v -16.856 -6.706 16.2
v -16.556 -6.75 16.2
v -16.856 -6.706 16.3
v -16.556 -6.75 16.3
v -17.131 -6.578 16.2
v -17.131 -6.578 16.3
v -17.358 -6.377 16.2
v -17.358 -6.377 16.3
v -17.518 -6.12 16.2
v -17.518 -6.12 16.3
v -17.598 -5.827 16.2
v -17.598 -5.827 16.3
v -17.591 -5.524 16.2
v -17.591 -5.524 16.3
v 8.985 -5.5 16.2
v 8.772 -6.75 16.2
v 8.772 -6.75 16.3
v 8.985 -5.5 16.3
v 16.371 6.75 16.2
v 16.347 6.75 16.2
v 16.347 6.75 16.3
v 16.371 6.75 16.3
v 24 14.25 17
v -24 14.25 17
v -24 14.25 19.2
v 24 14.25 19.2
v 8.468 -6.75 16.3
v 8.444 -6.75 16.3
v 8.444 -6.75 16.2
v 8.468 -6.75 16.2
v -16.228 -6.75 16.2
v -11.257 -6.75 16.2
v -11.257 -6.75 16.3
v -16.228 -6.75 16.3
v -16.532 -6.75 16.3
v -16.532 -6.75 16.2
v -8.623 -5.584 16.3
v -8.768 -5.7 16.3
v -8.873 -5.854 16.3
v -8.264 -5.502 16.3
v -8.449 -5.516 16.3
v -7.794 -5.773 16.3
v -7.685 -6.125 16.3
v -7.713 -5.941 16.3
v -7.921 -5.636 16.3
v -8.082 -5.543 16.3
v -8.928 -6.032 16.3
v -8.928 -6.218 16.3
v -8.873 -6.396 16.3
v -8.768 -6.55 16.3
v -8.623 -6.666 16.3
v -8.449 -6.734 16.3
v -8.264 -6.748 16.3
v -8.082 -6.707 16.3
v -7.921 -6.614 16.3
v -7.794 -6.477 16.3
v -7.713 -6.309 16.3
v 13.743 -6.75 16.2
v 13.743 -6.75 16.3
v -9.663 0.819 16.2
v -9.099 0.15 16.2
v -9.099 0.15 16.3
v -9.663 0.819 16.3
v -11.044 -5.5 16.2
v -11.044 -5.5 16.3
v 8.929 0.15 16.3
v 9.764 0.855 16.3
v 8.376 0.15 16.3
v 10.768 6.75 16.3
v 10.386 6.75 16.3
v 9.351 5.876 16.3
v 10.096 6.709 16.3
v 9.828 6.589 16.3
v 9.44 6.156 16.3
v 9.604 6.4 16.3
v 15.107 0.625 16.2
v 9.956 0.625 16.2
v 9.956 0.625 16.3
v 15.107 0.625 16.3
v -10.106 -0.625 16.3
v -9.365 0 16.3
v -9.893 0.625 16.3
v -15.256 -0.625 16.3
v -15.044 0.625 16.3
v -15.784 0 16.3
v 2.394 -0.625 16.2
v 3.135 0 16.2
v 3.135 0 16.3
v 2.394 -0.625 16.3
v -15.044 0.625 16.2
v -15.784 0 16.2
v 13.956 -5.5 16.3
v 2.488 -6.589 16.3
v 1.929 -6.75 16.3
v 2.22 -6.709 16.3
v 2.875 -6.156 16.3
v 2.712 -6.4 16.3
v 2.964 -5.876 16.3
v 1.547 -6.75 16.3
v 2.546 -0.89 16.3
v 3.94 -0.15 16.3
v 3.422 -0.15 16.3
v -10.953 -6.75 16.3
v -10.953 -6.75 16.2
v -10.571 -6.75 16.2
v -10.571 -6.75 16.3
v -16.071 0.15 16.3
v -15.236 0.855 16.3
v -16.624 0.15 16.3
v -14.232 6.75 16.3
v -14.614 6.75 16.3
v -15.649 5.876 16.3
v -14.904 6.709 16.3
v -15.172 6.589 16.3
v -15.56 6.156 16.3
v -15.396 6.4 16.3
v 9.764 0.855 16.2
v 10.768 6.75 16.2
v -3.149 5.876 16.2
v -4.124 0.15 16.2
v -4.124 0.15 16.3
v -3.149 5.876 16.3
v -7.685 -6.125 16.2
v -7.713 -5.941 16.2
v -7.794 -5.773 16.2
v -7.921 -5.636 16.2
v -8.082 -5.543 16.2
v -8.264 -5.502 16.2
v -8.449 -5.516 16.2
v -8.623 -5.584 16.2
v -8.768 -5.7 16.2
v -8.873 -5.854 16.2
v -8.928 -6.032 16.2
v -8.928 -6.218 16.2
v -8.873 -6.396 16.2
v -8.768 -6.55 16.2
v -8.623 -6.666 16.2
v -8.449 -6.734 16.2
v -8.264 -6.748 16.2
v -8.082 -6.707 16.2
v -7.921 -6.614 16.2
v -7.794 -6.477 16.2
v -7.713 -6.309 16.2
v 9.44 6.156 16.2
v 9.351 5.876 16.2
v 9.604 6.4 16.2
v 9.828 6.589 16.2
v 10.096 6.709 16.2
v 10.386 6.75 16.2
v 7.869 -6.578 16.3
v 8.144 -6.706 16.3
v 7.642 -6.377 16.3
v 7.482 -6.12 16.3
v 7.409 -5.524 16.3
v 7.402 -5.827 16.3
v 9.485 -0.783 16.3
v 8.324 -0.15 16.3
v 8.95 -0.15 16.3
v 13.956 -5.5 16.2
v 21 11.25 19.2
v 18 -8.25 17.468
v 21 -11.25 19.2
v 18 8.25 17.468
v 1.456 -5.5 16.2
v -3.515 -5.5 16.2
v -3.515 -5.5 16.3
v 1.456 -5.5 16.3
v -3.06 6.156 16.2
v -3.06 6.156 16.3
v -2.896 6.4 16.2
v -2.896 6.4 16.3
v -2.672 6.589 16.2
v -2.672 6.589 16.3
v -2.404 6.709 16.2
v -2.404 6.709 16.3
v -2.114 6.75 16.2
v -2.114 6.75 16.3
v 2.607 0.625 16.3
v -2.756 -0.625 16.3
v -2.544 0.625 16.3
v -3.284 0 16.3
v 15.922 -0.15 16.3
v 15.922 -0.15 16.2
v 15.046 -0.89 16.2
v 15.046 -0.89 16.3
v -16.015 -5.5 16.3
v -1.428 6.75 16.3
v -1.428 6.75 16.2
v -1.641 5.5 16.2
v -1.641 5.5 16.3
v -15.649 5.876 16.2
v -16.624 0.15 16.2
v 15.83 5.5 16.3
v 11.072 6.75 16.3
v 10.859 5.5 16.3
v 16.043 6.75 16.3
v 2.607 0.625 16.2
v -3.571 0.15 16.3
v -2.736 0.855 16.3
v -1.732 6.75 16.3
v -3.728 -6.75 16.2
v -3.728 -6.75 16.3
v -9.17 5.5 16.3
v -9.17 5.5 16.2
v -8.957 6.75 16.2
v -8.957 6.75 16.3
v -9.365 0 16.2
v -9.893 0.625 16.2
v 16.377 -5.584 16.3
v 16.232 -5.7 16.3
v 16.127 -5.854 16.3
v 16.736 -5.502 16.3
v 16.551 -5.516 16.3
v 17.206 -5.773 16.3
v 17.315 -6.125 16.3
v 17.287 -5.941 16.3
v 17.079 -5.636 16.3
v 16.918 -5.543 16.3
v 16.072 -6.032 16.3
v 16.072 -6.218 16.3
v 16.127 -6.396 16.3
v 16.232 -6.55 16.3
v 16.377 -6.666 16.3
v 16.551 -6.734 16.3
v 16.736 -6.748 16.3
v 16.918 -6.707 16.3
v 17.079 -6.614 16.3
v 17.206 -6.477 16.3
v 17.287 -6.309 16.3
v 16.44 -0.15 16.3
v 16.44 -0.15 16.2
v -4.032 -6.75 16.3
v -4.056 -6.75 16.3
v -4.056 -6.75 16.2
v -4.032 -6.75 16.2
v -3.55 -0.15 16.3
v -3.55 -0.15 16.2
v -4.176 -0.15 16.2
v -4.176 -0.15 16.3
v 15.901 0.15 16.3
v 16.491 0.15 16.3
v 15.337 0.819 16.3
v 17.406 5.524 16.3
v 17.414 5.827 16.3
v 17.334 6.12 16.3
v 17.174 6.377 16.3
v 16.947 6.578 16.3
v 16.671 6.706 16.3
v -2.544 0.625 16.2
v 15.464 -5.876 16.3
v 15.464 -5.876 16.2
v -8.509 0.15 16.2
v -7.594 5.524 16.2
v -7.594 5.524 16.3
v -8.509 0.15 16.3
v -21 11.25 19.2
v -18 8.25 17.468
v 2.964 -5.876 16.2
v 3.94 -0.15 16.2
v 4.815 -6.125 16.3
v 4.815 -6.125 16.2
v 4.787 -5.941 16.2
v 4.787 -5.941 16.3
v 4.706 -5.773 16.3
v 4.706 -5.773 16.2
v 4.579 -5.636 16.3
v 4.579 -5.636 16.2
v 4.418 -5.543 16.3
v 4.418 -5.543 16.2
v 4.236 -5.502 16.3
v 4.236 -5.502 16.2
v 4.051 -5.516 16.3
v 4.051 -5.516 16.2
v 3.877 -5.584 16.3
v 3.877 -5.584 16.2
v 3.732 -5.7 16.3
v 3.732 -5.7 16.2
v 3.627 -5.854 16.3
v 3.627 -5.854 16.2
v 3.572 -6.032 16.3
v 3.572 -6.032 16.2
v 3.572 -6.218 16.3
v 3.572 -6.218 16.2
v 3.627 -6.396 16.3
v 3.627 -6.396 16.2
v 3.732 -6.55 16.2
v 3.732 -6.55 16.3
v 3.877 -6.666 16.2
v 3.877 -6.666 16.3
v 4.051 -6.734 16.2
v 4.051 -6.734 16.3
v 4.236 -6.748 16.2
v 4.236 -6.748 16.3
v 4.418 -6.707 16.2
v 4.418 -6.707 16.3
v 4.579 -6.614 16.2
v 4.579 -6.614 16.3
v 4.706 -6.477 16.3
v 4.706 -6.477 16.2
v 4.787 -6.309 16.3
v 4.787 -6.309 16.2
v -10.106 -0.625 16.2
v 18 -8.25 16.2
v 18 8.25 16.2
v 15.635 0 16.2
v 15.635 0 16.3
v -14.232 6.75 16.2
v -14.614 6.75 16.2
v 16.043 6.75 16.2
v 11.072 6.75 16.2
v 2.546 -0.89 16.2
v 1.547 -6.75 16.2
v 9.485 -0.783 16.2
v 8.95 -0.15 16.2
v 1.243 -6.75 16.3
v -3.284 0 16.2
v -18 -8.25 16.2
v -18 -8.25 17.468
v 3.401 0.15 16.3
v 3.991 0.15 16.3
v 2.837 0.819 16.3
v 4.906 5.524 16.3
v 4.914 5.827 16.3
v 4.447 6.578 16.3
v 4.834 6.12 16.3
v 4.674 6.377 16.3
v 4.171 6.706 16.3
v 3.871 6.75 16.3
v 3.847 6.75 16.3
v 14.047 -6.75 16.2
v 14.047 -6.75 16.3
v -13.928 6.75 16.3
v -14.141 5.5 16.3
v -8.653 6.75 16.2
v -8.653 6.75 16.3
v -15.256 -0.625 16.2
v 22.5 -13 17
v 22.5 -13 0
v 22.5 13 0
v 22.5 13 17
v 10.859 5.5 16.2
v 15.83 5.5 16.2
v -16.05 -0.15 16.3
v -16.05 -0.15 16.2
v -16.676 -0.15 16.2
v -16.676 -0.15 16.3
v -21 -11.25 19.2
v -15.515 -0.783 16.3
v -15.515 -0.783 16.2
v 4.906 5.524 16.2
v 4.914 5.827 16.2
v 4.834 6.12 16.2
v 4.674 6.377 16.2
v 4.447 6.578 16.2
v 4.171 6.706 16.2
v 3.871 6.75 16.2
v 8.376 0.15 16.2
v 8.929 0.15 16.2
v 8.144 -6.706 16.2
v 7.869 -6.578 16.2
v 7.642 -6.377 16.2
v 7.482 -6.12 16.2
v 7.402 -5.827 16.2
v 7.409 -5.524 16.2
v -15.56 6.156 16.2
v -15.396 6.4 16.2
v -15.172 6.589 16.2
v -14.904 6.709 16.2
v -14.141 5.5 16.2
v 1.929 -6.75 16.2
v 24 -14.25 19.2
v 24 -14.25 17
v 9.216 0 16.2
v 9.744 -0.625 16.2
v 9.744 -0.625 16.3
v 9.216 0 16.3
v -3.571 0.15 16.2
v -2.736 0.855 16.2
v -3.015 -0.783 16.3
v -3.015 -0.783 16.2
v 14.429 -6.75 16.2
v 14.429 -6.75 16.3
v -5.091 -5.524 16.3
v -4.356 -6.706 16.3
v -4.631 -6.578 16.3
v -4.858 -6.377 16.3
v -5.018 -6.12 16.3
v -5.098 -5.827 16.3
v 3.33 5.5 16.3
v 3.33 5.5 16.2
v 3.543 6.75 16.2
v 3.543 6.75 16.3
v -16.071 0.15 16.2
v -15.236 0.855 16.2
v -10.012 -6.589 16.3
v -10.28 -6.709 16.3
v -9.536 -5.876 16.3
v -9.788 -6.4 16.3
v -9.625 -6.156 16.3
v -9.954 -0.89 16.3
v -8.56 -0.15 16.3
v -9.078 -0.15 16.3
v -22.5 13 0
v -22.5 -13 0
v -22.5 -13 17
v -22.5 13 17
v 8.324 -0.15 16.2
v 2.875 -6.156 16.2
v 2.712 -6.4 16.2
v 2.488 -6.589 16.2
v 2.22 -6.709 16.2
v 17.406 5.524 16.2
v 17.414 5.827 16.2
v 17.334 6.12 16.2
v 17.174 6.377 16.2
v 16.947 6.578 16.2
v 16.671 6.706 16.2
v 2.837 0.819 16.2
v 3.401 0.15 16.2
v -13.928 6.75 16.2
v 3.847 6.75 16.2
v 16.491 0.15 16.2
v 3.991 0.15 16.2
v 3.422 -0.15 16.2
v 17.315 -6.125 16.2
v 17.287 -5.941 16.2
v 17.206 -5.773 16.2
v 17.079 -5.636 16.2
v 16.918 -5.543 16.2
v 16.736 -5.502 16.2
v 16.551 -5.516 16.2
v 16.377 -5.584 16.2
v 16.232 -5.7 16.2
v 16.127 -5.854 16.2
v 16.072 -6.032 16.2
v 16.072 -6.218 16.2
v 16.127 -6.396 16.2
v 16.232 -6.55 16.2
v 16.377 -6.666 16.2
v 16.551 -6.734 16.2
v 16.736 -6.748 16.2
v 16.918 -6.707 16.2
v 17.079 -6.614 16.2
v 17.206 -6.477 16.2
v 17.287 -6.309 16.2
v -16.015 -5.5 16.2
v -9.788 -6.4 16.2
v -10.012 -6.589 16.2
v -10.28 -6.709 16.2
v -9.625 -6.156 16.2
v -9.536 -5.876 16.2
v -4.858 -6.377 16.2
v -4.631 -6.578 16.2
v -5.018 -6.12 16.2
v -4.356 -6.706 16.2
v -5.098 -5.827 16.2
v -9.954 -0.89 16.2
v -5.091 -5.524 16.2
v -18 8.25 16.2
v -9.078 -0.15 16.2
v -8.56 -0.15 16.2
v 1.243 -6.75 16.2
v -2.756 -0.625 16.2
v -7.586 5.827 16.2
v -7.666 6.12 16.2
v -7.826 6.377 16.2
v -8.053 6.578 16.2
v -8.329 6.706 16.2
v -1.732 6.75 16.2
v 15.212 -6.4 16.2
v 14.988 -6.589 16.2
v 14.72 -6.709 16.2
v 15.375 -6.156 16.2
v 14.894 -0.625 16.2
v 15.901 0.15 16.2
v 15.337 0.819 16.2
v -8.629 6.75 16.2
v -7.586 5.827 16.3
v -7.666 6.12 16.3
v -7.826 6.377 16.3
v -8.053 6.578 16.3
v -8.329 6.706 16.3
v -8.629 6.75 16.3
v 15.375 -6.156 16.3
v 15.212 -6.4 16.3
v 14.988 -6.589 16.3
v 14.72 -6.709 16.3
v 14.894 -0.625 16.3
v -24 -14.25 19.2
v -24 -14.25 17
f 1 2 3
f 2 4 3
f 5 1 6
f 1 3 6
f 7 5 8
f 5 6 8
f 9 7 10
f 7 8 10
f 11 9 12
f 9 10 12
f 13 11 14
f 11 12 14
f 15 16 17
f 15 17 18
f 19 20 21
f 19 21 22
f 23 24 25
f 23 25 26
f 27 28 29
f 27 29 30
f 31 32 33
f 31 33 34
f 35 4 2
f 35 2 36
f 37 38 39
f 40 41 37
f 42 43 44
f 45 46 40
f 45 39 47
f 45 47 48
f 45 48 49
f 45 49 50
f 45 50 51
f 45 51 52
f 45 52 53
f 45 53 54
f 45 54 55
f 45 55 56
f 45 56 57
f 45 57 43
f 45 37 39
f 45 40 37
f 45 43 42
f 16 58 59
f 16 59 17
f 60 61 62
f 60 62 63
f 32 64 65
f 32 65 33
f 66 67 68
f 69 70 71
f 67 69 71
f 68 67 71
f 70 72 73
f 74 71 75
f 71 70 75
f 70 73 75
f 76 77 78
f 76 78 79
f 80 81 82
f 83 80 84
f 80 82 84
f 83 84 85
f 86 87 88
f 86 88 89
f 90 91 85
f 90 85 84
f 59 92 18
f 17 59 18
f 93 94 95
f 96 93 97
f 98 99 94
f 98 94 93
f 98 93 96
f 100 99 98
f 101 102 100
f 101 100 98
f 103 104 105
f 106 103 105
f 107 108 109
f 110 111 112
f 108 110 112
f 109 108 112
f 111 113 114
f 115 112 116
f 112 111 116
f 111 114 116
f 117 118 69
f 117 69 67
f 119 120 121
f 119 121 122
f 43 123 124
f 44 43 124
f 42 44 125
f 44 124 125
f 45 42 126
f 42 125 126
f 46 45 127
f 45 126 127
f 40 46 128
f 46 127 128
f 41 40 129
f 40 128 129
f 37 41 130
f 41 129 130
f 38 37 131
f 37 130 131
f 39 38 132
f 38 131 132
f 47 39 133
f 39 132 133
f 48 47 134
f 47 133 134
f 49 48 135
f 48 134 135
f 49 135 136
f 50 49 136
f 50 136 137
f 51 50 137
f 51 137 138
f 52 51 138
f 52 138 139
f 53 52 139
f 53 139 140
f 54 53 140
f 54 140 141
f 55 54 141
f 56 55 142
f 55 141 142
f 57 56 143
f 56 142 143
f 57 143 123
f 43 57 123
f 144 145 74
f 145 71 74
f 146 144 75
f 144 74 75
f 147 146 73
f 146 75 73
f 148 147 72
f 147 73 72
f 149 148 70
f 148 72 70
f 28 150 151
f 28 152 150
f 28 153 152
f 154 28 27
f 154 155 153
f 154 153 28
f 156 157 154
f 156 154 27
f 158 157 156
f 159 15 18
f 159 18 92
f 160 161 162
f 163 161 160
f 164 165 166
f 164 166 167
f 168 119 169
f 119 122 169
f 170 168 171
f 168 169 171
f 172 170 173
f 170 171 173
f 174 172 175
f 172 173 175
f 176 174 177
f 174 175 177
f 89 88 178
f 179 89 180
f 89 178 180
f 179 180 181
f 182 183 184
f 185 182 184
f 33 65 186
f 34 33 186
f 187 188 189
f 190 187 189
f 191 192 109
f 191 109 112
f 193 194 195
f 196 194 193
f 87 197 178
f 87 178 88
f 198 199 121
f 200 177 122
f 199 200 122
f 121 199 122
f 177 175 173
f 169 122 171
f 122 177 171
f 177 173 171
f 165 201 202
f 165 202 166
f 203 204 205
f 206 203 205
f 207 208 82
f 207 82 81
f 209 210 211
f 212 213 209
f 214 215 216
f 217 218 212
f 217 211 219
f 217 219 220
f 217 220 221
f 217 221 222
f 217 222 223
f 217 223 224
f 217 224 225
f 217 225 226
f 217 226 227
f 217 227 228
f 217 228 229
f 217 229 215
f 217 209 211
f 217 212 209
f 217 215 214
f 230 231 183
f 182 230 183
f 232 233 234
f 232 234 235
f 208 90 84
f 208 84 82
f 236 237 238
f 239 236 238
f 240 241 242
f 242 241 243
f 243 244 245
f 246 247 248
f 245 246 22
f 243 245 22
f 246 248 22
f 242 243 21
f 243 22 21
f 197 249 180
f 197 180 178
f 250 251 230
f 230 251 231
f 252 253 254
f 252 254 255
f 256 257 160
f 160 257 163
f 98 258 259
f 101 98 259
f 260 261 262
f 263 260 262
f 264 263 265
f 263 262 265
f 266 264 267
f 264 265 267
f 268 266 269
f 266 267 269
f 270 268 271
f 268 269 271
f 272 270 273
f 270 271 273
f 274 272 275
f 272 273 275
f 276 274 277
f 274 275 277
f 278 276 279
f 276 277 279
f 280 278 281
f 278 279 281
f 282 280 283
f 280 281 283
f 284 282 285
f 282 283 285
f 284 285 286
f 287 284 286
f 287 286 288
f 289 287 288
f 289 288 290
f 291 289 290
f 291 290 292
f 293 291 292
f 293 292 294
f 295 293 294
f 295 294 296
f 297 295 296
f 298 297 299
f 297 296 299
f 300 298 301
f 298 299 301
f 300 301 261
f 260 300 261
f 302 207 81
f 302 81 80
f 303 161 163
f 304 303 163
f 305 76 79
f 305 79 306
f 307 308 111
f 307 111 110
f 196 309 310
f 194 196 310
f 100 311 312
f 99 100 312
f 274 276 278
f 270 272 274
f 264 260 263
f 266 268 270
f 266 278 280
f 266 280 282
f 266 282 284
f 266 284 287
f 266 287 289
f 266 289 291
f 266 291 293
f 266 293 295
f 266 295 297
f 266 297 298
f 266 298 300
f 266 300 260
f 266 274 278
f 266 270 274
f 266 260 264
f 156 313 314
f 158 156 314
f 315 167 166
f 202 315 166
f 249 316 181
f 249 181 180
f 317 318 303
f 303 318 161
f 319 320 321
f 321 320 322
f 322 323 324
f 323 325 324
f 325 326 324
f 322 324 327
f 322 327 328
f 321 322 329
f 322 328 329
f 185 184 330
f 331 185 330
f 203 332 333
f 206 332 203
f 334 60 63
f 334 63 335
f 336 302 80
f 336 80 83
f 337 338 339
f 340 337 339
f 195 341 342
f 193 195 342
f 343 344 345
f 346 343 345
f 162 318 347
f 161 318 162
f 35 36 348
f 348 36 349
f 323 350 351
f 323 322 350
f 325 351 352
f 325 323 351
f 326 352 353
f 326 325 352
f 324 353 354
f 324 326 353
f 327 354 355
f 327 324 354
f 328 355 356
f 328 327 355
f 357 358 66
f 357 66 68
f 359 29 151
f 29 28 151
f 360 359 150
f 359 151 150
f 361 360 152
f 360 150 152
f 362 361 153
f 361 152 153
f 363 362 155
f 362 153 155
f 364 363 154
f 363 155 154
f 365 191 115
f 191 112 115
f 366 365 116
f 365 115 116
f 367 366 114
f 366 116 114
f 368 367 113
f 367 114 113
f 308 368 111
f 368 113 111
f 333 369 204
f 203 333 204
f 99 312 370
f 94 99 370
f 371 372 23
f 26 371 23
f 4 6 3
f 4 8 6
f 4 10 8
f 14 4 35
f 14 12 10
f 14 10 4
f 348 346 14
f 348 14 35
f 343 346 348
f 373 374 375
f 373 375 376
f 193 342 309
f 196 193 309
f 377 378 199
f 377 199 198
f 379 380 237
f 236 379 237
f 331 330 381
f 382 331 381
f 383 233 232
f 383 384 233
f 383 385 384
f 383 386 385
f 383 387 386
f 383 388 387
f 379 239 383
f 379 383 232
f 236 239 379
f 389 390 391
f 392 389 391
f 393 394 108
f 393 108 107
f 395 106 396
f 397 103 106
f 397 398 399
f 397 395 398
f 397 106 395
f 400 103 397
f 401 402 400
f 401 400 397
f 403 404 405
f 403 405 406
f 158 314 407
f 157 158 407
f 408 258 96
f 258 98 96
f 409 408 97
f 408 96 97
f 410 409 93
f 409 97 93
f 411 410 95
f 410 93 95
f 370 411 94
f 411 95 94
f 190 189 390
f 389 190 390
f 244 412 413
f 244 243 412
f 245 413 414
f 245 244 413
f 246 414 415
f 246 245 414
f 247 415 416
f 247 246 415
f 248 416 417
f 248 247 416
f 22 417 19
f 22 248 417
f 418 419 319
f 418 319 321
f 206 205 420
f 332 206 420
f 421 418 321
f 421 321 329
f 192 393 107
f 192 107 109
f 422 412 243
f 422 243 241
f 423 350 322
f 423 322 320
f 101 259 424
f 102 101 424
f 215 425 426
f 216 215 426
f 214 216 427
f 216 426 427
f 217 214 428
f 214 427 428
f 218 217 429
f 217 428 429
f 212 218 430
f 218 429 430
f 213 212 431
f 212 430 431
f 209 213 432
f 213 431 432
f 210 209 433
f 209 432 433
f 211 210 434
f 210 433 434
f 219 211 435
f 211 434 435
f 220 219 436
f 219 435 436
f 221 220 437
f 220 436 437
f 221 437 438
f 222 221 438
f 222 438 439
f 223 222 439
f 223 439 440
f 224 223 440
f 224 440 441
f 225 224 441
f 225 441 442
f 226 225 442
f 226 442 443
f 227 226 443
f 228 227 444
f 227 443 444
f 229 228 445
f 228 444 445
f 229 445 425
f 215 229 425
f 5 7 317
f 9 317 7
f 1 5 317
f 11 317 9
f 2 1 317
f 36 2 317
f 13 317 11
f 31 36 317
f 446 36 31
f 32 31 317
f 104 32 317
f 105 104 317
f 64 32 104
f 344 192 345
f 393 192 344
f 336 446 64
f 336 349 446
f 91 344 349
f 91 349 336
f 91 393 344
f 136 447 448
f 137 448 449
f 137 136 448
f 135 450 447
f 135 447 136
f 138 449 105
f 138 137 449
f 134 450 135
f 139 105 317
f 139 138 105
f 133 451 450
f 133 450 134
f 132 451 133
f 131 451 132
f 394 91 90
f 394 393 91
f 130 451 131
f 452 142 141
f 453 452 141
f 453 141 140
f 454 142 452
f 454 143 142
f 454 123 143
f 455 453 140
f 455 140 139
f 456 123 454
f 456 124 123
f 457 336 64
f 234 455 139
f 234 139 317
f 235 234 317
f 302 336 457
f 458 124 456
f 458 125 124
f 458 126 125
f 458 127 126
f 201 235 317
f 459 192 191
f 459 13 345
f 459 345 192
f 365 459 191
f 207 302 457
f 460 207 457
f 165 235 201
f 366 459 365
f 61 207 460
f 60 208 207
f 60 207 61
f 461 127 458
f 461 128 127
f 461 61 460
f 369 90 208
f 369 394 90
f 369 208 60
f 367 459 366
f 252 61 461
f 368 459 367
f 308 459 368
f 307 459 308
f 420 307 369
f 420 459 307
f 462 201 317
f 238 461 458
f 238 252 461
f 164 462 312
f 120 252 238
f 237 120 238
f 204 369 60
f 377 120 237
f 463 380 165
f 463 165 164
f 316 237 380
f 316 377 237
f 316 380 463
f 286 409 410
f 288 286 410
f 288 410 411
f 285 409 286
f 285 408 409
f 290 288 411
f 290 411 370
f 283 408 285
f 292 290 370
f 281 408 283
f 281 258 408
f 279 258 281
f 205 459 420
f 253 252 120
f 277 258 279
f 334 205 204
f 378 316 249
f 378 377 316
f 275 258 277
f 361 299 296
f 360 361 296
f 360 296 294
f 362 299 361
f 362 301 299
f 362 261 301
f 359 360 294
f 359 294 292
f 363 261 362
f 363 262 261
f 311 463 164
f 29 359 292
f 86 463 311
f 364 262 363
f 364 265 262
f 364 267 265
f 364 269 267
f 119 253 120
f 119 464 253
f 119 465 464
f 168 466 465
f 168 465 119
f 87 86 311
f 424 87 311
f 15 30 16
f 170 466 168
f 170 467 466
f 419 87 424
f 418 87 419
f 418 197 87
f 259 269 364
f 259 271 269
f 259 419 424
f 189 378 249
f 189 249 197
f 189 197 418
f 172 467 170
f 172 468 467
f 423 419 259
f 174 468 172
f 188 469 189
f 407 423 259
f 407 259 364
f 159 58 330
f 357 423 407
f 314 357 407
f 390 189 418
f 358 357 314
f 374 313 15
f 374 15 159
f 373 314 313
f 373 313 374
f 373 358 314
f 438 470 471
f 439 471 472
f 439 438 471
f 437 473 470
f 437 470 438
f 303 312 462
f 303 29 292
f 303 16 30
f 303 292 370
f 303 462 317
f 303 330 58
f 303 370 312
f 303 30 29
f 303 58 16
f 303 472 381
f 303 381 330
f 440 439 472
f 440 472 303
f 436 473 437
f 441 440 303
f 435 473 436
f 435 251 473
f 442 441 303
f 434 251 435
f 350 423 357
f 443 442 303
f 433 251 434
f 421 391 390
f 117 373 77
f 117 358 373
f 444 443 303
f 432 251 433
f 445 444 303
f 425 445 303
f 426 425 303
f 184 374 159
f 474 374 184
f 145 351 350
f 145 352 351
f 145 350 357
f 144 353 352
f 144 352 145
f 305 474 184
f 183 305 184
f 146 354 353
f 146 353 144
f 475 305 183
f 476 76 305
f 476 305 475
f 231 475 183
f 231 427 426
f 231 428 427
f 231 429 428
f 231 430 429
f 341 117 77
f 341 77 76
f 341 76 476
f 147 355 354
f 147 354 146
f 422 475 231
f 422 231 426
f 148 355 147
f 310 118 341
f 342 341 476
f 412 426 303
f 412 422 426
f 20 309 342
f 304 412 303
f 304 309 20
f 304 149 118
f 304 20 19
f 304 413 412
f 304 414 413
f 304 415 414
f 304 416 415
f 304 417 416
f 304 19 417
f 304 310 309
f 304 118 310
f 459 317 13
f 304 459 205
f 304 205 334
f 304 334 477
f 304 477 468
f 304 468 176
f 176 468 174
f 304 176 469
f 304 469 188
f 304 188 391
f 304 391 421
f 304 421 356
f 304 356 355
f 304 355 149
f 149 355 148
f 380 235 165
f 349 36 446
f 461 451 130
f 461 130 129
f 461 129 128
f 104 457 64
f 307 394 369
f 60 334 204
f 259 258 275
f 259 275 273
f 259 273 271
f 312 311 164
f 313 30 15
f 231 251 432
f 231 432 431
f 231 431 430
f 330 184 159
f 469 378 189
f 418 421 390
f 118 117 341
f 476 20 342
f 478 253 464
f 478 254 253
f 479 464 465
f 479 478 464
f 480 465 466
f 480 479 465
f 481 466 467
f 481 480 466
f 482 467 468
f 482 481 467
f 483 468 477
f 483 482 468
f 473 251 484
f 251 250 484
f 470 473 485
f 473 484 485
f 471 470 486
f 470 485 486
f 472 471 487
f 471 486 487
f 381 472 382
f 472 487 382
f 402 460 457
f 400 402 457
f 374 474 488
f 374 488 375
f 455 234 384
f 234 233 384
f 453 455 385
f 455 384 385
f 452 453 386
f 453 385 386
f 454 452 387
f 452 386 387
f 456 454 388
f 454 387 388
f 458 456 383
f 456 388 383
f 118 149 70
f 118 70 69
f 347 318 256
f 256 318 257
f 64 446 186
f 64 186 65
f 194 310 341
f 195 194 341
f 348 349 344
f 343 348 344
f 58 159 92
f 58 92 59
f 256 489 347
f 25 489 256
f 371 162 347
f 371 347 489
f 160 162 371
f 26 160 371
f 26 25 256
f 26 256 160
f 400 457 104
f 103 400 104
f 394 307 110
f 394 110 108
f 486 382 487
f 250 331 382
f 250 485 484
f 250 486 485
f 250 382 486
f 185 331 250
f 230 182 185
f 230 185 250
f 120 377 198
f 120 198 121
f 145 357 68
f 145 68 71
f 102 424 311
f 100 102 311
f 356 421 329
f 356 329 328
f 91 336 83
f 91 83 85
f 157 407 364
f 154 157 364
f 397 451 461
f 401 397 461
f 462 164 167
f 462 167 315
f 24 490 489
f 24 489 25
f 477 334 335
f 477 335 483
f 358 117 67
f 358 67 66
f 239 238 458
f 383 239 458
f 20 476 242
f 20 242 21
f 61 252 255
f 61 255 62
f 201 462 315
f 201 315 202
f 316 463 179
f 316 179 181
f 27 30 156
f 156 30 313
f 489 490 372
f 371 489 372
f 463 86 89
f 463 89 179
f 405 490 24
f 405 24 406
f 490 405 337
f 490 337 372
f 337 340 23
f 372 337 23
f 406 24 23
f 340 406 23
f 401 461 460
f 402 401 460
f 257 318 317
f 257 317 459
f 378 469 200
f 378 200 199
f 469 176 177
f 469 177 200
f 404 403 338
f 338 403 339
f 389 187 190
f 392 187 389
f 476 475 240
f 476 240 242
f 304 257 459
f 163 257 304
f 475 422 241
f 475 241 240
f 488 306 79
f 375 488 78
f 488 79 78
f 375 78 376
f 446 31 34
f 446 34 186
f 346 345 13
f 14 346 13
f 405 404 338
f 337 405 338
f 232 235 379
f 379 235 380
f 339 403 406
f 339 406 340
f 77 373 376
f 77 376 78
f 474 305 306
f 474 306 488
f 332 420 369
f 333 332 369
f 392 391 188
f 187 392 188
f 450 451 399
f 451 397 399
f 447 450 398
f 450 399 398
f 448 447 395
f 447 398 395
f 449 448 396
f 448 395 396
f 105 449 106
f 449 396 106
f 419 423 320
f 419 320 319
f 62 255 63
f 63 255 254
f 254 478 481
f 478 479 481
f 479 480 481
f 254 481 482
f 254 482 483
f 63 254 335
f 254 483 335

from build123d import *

# Parameters (mm, degrees)
SKETCH_1_W                    = 45
SKETCH_1_H                    = 26
BOSS_EXTRUDE1_DEPTH           = 17
SKETCH_W                      = 48
SKETCH_H                      = 28.5
BOSS_EXTRUDE2_DEPTH           = 2.2
SKETCH_3_W                    = 36
SKETCH_3_H                    = 16.5
CUT_EXTRUDE1_DEPTH            = 3
CHAMFER_1_SIZE                = 3
CHAMFER_1_SIZE2               = 1.732050808
SKETCH_4_R                    = 0.625
BOSS_EXTRUDE3_DEPTH           = 0.1
ROUNDING_1_R                  = 1.05
LINEAR_ARRAY1_COUNT           = 3
LINEAR_ARRAY1_PITCH           = 12.5
ROUNDING_1_OF_LINEAR_ARRAY1_R = 1.05


with BuildPart() as part:
    # sketch 1 → Boss-Extrude1 (new body)
    with BuildSketch(Plane.XY):
        Rectangle(SKETCH_1_W, SKETCH_1_H)
    extrude(amount=BOSS_EXTRUDE1_DEPTH)

    # sketch → Boss-Extrude2 (add)
    with BuildSketch(Plane.XY.offset(17)):
        Rectangle(SKETCH_W, SKETCH_H)
    extrude(amount=BOSS_EXTRUDE2_DEPTH)

    # sketch 3 → Cut-Extrude1 (cut)
    with BuildSketch(Plane.XY.offset(19.2)):
        Rectangle(SKETCH_3_W, SKETCH_3_H)
    extrude(amount=-CUT_EXTRUDE1_DEPTH, mode=Mode.SUBTRACT)

    # chamfer 1
    chamfer_1_edges = [part.edges().sort_by_distance(p)[0] for p in [
        (-18, 0, 19.2),
        (0, -8.25, 19.2),
        (18, 0, 19.2),
        (0, 8.25, 19.2),
    ]]
    chamfer_1_side = [part.faces().sort_by_distance(p)[0] for p in [
        (0, -13.691766178, 19.2),
    ]]
    chamfer(chamfer_1_edges, length=CHAMFER_1_SIZE, length2=CHAMFER_1_SIZE2, reference=chamfer_1_side[0])

    # sketch 4 → Boss-Extrude3 (add)
    with BuildSketch(Plane.XY.offset(16.2)):
        with Locations((-8.310233245, -6.125)):
            Circle(SKETCH_4_R)
        Polygon((-17.8, -6.75), (-16.531988477, -6.75), (-15.515440373, -0.783304607), (-16.049974064, -0.15), (-16.675555556, -0.15), align=None)
        Polygon((-9.68472625, -6.75), (-8.560281805, -0.15), (-9.077616658, -0.15), (-9.954369729, -0.890013653), (-10.952737773, -6.75), align=None)
        Polygon((-15.5, 6.75), (-14.231988477, 6.75), (-15.236353449, 0.854814294), (-16.071403038, 0.15), (-16.624444444, 0.15), align=None)
        Polygon((-8.509170694, 0.15), (-9.099045632, 0.15), (-9.66328895, 0.818503966), (-8.652737773, 6.75), (-7.38472625, 6.75), align=None)
        Polygon((-15.784003603, 0), (-15.04351636, 0.625), (-9.892540373, 0.625), (-9.365016093, 0), (-10.105503336, -0.625), (-15.256479323, -0.625), align=None)
        Polygon((-13.927665711, 6.75), (-14.140628674, 5.5), (-9.170023502, 5.5), (-8.957060539, 6.75), align=None)
        Polygon((-16.227665711, -6.75), (-16.014702748, -5.5), (-11.044097576, -5.5), (-11.257060539, -6.75), align=None)
    boss_extrude3 = extrude(amount=BOSS_EXTRUDE3_DEPTH)

    # rounding 1
    rounding_1_edges = [part.edges().sort_by_distance(p)[0] for p in [
        (-17.8, -6.75, 16.25),
        (-9.68472625, -6.75, 16.25),
        (-7.38472625, 6.75, 16.25),
        (-15.5, 6.75, 16.25),
    ]]
    fillet(rounding_1_edges, radius=ROUNDING_1_R)

    # Linear array1: Boss-Extrude3 ×3
    with Locations(*[(i * LINEAR_ARRAY1_PITCH, 0, 0) for i in range(1, LINEAR_ARRAY1_COUNT)]):
        add(boss_extrude3)

    # rounding 1 of Linear array1
    rounding_1_of_linear_array1_edges = [part.edges().sort_by_distance(p)[0] for p in [
        (-5.3, -6.75, 16.25),
        (2.81527375, -6.75, 16.25),
        (5.11527375, 6.75, 16.25),
        (-3, 6.75, 16.25),
        (7.2, -6.75, 16.25),
        (15.31527375, -6.75, 16.25),
        (17.61527375, 6.75, 16.25),
        (9.5, 6.75, 16.25),
    ]]
    fillet(rounding_1_of_linear_array1_edges, radius=ROUNDING_1_OF_LINEAR_ARRAY1_R)


solid = part.part
